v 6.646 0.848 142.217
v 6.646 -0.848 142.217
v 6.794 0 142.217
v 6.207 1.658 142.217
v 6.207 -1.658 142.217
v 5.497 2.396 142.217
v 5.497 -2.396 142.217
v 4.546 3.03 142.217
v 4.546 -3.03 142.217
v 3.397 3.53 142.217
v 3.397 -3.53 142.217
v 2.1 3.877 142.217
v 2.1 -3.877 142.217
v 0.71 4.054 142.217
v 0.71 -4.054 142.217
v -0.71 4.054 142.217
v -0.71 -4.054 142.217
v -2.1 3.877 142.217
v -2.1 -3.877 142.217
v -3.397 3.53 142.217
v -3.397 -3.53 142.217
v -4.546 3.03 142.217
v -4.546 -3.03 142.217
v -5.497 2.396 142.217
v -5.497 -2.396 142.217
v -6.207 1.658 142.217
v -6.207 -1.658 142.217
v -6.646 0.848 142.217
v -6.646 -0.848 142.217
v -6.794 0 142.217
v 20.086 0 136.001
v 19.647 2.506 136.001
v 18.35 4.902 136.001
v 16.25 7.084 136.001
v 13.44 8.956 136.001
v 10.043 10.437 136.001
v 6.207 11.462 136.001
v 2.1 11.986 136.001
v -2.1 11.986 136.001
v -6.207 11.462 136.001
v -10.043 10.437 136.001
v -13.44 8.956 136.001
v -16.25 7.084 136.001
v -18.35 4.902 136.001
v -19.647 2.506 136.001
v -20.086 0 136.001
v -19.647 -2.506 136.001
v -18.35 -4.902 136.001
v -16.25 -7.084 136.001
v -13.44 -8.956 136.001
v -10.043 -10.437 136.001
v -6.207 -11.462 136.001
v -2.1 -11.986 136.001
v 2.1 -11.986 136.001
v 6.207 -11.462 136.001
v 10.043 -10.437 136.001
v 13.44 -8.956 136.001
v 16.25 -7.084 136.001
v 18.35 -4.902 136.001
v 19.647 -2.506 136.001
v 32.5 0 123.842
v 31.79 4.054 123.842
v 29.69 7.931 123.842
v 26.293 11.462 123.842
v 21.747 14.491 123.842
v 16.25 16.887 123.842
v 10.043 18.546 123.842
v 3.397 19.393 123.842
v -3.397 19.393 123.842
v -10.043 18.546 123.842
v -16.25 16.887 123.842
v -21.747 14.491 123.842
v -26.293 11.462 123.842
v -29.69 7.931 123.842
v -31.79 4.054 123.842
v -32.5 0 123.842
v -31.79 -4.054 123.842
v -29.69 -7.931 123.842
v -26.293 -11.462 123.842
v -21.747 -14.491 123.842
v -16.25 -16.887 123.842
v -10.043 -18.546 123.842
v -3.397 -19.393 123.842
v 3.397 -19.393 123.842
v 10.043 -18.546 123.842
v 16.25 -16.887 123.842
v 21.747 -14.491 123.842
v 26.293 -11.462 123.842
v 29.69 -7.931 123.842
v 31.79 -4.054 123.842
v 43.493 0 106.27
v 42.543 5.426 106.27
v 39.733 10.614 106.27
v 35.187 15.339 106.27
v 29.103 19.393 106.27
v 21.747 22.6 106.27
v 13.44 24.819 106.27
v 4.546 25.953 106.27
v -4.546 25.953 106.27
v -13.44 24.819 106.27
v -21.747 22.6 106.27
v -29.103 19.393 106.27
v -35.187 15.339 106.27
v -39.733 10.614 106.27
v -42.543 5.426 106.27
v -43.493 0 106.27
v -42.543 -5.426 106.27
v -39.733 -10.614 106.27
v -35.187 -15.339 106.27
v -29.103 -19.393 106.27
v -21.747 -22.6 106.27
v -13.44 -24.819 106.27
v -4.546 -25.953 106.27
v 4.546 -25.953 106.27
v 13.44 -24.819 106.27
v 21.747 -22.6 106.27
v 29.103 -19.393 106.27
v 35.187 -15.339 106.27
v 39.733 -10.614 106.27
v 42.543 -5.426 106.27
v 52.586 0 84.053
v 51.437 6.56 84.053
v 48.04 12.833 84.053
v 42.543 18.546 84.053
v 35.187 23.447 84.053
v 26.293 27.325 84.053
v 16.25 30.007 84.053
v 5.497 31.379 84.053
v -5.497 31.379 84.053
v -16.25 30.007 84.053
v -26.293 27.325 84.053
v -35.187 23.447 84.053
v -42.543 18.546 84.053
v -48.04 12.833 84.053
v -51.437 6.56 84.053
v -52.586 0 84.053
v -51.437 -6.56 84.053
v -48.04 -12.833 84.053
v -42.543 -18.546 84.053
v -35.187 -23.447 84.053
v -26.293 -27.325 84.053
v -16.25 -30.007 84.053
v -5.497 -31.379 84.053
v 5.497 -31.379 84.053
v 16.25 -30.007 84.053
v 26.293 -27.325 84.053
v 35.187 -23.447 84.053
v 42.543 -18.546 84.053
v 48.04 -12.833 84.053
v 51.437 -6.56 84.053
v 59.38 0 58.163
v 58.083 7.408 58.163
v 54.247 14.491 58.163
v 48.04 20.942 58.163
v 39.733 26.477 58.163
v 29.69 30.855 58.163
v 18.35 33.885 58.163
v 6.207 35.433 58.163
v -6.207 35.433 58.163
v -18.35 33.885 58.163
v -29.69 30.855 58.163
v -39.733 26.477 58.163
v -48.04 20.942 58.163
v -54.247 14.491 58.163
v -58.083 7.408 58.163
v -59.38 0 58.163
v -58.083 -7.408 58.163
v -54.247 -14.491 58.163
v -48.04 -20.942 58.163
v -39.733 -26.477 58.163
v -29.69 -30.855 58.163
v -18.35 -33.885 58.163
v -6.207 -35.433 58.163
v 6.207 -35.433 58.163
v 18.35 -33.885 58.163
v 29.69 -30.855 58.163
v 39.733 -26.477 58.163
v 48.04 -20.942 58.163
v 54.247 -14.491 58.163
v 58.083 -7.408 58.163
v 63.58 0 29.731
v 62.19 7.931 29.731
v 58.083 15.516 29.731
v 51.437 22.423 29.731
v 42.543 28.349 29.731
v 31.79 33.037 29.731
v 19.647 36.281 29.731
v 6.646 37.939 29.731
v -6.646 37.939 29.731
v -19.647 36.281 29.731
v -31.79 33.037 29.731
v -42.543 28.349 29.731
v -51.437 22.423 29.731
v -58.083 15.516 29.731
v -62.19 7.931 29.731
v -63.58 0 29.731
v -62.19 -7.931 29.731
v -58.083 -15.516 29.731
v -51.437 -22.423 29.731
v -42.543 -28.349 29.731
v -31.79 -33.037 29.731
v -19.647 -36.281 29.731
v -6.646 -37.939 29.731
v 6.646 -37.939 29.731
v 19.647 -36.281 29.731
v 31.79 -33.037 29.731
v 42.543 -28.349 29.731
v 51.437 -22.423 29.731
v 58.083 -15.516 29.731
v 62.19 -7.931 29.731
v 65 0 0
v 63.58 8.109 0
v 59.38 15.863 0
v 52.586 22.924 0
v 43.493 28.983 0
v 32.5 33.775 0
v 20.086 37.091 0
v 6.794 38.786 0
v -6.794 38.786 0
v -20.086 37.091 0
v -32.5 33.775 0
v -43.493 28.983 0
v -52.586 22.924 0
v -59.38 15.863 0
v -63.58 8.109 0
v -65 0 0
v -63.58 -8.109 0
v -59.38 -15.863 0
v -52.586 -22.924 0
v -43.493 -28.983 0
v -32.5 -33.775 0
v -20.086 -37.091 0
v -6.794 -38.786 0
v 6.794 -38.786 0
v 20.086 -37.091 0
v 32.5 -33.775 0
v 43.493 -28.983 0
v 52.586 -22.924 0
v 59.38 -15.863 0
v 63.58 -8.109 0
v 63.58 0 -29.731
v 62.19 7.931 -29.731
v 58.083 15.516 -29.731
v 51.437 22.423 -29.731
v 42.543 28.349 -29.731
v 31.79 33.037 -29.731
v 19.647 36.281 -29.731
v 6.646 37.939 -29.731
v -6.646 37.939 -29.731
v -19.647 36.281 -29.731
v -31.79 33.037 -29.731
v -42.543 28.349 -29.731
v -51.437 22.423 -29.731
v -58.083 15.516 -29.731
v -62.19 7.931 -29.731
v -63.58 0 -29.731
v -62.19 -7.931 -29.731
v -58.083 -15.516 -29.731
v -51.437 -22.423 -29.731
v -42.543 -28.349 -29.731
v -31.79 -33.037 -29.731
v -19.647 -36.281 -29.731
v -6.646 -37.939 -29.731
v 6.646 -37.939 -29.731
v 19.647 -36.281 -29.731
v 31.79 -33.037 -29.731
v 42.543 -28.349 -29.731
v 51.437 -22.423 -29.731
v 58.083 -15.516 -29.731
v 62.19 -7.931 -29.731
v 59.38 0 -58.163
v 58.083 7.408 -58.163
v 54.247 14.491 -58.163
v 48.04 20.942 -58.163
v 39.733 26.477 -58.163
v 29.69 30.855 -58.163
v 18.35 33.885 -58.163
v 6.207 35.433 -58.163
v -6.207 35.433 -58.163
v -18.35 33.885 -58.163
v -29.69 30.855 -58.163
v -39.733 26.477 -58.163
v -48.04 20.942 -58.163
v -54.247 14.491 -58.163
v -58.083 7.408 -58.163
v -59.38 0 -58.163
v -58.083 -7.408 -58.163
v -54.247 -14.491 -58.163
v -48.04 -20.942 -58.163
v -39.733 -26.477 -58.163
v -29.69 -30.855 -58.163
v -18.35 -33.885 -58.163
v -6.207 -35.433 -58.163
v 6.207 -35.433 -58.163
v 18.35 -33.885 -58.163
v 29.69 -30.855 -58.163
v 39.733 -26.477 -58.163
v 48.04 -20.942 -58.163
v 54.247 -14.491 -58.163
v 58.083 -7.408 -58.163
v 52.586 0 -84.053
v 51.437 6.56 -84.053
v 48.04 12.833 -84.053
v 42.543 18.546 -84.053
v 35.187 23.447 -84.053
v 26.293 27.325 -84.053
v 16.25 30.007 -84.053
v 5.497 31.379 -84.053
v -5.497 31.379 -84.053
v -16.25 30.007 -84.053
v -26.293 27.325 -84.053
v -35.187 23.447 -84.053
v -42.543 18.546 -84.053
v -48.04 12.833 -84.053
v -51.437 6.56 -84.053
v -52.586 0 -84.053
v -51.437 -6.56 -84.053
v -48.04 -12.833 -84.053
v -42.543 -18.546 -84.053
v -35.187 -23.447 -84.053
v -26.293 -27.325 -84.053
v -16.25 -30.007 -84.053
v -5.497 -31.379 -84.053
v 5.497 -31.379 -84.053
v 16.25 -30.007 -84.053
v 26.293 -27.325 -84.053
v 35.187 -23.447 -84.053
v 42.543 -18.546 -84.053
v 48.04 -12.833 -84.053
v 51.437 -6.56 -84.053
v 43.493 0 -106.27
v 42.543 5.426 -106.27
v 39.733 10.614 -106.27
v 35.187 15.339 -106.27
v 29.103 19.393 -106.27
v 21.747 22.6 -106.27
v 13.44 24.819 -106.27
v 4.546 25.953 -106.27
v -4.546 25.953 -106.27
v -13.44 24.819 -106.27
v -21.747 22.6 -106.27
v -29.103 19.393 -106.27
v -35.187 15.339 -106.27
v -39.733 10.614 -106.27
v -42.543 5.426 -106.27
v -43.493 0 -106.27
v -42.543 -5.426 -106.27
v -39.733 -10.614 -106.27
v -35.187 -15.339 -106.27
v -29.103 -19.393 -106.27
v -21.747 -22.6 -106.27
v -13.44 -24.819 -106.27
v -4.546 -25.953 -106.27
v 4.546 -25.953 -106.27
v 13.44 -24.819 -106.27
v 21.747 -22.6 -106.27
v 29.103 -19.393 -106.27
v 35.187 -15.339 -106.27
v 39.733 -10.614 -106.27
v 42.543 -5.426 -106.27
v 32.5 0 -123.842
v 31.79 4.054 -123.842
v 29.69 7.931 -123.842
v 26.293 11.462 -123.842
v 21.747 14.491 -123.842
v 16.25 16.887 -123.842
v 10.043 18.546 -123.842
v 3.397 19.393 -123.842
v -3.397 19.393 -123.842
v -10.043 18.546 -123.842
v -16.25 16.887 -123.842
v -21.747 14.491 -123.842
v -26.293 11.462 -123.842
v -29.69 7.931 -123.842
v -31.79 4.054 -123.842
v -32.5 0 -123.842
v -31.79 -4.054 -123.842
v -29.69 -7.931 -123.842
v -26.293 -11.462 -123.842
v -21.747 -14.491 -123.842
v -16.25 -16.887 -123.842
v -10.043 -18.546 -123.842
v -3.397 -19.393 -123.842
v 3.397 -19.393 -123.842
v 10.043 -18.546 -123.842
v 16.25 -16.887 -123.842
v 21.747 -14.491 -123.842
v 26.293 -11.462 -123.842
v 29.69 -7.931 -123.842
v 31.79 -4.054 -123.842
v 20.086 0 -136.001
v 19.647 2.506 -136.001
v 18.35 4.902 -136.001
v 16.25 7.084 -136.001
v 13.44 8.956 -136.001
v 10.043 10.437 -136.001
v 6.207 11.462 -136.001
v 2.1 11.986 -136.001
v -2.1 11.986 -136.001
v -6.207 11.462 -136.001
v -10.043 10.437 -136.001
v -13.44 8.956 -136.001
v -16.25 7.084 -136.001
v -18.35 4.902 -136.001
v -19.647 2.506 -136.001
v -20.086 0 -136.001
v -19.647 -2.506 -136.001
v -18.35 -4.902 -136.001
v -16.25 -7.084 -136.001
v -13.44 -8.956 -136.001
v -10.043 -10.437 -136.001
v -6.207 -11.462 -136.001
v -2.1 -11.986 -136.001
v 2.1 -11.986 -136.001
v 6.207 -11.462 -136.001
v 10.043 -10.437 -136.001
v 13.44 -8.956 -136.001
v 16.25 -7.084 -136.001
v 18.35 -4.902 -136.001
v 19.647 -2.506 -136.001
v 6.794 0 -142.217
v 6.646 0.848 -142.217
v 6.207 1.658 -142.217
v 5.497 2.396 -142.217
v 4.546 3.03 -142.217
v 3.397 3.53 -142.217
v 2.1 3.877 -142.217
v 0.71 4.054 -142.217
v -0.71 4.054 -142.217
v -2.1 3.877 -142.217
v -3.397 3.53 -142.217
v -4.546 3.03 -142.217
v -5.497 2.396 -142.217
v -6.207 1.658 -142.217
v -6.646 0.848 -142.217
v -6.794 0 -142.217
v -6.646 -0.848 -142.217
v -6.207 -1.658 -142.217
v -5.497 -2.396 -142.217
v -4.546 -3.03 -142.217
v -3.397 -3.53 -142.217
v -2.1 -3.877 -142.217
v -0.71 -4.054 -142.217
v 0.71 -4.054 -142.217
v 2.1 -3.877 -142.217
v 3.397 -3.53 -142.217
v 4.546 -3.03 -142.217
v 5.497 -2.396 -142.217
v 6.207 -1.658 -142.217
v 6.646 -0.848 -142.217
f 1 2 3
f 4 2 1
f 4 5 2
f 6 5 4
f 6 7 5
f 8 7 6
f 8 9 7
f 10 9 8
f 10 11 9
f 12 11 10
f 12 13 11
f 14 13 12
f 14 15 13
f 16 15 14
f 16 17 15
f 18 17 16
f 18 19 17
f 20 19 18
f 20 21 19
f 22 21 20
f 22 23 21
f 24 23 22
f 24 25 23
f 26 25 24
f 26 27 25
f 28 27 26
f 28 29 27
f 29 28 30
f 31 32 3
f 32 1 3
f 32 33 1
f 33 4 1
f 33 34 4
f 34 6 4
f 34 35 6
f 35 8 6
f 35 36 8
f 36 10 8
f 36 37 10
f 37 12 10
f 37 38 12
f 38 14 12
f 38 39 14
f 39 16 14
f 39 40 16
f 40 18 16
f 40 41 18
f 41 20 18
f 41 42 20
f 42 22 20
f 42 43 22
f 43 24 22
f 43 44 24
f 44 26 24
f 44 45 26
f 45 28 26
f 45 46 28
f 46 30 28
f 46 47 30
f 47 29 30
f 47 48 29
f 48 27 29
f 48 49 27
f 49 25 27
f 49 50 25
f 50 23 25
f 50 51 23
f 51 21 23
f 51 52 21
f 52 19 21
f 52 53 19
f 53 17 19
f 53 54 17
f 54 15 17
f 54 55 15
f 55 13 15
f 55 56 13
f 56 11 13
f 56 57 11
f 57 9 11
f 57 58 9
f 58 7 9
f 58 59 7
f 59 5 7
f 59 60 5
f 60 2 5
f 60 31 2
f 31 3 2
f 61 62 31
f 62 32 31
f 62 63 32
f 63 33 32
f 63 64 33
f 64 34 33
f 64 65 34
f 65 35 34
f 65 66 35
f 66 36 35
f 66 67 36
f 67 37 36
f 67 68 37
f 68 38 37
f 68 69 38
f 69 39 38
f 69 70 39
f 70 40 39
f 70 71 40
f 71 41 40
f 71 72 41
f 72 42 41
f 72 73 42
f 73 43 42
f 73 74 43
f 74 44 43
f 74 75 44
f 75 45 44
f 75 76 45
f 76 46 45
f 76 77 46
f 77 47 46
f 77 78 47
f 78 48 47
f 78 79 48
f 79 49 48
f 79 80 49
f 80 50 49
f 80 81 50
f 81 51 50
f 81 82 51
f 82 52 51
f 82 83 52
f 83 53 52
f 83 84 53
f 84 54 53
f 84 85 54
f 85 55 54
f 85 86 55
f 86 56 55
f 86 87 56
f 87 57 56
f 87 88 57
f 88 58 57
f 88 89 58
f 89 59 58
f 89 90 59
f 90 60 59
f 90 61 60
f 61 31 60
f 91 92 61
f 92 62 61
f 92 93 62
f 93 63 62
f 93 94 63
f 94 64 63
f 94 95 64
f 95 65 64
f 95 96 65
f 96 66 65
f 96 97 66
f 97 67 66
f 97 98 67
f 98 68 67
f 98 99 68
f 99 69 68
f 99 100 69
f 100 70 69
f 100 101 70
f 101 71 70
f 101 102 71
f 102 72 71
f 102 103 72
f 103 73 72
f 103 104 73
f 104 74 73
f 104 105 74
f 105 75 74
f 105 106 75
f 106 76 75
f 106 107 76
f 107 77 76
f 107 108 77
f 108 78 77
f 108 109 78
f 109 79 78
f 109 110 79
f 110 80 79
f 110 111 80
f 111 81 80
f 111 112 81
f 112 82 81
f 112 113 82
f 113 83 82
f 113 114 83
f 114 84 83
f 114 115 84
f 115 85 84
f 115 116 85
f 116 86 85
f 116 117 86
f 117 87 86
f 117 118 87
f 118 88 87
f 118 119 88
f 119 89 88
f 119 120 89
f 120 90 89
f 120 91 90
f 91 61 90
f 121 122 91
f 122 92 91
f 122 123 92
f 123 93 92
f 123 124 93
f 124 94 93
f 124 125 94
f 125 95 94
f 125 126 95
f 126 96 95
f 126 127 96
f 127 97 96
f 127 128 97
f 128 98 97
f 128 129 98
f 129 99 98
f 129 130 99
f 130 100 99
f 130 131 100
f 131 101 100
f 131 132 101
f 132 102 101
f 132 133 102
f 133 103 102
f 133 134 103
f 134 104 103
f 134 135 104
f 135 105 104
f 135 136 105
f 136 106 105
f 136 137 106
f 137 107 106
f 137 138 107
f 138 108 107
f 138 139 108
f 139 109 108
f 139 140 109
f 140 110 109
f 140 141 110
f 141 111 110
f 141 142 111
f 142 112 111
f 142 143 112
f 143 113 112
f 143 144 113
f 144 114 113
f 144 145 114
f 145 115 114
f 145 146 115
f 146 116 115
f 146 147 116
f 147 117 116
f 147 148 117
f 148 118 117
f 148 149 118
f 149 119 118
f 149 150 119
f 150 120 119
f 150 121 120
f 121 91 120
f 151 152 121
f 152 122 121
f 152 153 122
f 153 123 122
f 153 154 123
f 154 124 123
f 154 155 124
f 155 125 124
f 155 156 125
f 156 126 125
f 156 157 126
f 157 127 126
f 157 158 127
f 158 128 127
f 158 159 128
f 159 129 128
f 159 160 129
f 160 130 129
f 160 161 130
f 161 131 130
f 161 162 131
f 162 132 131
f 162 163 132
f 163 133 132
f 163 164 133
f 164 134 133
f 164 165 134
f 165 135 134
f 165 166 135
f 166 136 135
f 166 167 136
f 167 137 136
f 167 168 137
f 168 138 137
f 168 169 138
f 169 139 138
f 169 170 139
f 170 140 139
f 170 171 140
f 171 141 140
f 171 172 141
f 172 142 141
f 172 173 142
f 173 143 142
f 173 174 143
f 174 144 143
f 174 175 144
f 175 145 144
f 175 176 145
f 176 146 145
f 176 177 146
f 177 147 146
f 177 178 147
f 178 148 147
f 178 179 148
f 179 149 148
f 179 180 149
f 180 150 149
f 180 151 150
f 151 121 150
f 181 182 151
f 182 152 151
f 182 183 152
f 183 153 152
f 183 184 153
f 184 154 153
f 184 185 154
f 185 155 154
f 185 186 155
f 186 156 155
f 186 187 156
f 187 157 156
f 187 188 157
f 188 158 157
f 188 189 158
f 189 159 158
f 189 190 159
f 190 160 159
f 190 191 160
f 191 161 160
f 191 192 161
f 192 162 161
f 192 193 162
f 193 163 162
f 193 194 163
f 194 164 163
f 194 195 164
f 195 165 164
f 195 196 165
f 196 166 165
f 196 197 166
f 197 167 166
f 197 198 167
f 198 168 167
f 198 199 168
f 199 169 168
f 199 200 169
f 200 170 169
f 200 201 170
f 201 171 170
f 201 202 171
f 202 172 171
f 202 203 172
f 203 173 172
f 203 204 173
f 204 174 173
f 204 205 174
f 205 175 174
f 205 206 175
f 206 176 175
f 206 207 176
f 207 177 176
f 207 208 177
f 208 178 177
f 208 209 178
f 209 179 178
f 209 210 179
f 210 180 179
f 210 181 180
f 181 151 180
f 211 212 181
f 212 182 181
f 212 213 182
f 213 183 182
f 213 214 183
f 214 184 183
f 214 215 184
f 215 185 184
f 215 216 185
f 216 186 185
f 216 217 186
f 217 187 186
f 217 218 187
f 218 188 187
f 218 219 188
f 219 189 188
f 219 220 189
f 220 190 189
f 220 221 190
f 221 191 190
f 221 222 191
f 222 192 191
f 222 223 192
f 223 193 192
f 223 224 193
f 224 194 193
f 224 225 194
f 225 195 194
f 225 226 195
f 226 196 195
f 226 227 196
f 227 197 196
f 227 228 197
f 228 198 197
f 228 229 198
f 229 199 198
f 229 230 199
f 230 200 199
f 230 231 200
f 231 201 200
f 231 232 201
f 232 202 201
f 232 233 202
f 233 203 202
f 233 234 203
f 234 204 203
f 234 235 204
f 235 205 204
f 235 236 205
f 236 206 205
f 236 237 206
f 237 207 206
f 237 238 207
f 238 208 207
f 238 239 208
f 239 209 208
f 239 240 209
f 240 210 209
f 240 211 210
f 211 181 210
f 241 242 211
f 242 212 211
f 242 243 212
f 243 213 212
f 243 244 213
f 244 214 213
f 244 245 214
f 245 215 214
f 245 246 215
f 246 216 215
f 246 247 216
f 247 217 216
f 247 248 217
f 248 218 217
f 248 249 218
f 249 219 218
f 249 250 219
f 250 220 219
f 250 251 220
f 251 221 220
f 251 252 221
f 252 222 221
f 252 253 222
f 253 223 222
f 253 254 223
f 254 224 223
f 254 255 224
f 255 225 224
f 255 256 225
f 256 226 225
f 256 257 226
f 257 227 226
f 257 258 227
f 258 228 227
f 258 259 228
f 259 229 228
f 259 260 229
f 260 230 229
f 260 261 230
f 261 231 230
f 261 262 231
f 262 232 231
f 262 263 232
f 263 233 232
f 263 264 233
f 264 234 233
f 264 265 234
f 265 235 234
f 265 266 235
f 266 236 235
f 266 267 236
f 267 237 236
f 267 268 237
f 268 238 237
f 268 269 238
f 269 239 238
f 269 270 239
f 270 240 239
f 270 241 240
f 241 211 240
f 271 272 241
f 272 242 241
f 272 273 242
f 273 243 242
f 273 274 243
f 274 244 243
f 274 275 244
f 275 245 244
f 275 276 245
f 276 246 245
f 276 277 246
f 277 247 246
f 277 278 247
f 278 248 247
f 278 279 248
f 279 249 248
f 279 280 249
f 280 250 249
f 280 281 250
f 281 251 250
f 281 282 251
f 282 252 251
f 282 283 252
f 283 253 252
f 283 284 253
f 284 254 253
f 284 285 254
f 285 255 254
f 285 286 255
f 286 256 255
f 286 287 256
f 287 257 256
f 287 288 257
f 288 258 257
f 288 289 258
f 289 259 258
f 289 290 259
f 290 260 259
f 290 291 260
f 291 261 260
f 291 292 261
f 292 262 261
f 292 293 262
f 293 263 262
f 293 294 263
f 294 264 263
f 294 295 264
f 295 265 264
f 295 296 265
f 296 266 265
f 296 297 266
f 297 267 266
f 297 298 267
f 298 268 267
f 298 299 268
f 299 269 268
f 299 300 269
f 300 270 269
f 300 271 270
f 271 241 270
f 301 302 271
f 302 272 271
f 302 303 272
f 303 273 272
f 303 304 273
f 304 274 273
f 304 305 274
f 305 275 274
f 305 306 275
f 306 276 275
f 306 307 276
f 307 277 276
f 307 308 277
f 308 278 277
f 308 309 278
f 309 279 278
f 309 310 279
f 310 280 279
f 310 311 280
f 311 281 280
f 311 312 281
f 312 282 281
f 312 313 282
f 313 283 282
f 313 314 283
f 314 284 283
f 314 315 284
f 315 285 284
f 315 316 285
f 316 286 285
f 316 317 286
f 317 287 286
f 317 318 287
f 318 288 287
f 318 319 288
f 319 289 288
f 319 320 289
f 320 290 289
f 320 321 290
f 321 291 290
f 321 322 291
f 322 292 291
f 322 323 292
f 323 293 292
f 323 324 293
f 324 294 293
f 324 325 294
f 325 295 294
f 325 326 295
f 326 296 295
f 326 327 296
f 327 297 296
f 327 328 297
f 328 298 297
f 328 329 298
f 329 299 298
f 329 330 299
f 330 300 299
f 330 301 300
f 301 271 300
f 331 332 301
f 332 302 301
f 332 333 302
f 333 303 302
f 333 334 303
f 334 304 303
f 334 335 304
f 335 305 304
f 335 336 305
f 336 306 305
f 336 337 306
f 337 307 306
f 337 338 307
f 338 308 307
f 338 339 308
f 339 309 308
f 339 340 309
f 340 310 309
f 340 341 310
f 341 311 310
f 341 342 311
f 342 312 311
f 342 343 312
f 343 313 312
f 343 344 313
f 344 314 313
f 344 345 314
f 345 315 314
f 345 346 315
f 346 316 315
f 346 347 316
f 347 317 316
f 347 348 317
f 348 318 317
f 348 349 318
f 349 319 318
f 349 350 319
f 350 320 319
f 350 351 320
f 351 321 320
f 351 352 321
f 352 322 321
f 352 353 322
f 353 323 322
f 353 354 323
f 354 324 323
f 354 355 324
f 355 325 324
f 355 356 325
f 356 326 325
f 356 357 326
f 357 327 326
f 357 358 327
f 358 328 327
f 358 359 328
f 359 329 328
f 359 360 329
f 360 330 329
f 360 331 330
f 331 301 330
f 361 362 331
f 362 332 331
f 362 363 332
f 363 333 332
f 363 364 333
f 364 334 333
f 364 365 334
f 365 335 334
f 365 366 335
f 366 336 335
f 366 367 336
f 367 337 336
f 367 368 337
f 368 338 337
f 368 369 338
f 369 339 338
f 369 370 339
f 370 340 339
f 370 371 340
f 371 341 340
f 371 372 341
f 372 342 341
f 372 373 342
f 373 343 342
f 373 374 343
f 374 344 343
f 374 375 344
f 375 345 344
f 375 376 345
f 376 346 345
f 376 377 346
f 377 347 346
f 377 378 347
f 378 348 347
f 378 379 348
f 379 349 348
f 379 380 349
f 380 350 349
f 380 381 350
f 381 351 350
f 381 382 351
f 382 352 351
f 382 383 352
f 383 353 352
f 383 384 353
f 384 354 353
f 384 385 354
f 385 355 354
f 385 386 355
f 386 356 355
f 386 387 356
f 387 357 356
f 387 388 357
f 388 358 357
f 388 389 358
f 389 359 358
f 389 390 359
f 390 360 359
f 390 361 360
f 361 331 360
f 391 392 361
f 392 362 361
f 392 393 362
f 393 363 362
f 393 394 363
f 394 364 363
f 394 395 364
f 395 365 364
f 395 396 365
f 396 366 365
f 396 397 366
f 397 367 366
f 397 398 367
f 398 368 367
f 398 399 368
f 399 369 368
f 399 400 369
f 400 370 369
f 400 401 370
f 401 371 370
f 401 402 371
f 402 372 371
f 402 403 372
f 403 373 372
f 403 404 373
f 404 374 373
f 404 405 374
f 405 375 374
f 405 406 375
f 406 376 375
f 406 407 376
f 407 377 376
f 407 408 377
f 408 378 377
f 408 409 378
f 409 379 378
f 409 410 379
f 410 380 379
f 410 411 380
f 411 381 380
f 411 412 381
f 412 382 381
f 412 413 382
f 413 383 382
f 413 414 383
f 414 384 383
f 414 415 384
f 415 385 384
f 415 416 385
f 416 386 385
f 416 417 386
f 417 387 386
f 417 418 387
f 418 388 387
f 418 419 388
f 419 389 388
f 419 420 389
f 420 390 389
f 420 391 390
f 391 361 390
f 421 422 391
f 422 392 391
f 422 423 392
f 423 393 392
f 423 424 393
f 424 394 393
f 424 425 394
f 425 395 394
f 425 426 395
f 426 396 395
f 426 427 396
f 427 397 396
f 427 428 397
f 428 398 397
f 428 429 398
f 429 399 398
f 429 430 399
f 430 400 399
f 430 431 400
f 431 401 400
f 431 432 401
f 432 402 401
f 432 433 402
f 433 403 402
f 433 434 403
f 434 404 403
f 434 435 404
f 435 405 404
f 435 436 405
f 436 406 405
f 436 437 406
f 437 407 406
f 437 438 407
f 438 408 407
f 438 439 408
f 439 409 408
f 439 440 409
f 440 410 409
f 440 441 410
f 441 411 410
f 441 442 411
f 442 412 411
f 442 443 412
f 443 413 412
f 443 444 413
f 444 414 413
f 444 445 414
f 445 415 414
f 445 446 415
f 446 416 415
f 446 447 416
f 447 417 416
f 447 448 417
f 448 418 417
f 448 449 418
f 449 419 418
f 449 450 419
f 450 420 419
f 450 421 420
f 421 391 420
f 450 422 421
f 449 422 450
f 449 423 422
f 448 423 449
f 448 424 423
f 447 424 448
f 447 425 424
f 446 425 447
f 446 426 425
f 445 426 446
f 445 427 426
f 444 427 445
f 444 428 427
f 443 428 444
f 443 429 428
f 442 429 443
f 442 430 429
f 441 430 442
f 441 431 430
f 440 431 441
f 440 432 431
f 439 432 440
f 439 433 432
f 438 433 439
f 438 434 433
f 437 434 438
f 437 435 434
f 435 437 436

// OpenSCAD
// Generated by SolidPython 1.0.1 on 2020-07-29 00:46:46


scale(v = [5, 3, 11]) {
	sphere(r = 13);
}
/***********************************************
*********      SolidPython code:      **********
************************************************
 
# import packages: SolidPython
from solid import *
from solid.utils import *
from itertools import chain, combinations, permutations


class Resize:

    def __init__(self, scad_file):
        self.scad_file = scad_file
        #self.scad_file = import_scad(scad_file)
        # cone/cylinder param:
        self.r1 = 0
        self.r2 = 0
        self.h = 0
        # rectangular prism param:
        self.w = 0
        self.l = 0
        # ellipse param:
        self.r = 0

    # import OpenScad code (file name corresponds to shape)


    # classify shape + parameters
    def assign(self, param1, param2, param3):
        if self.scad_file == 'cone.scad':
            self.r1 = param1
            self.r2 = param2
            self.h = param3
        elif self.scad_file == 'cylinder.scad':
            self.r1 = param1
            self.r2 = param2
            self.h = param3
        elif self.scad_file == 'rectangularPrism.scad':
            self.h = param1
            self.l = param2
            self.w = param3
        else:
            self.r = param1
            self.h = param2

    # resize parameters
    def iterate(self):
        x = range(3, 20, 2)
        i = 1
        if self.scad_file == 'cone.scad':
            tempList = list(permutations(x, 2))
            for temp in tempList:
                param1 = temp[0]
                param2 = temp[1]
                filepath = 'produced_scad_files/' + 'cone' + str(param1) + '_' + str(param2) + '_' + '.scad'
                scad_render_to_file(cylinder(h=param1, r1=param2, r2=0), filepath)

        elif self.scad_file == 'cylinder.scad':
            tempList = list(permutations(x, 3))
            for temp in tempList:
                param1 = temp[0]
                param2 = temp[1]
                filepath = 'produced_scad_files/' + 'cylinder' + str(param1) + '_' + str(param2) + '_' + '.scad'
                scad_render_to_file(cylinder(h=param1, r1=param2, r2=param2), filepath)

        elif self.scad_file == 'rectangularPrism.scad':
            tempList = list(permutations(x, 3))
            for temp in tempList:
                param1 = temp[0]
                param2 = temp[1]
                param3 = temp[2]
                filepath = 'produced_scad_files/' + 'rectangularPrism' + str(param1) + '_' + str(param2) + '_' + str(
                    param3) + '.scad'
                scad_render_to_file(cube(size=(param1, param2, param3)), filepath)

        elif self.scad_file == 'ellipse.scad':
            tempList = list(permutations(x, 4))
            for temp in tempList:
                param1 = temp[0]
                param2 = temp[1]
                param3 = temp[2]
                param4 = temp[3]
                filepath = 'produced_scad_files/' + 'ellipse' + str(param1) + '_' + str(param2) + '_' + str(param3) + '_' + str(param4) + '.scad'
                scad_render_to_file(scale([param1, param2, param3])(sphere(r=param4)), filepath)

    def render_to_scadfile(self):
        scad_render_to_file(scad, 'example.scad') 
 
************************************************/
